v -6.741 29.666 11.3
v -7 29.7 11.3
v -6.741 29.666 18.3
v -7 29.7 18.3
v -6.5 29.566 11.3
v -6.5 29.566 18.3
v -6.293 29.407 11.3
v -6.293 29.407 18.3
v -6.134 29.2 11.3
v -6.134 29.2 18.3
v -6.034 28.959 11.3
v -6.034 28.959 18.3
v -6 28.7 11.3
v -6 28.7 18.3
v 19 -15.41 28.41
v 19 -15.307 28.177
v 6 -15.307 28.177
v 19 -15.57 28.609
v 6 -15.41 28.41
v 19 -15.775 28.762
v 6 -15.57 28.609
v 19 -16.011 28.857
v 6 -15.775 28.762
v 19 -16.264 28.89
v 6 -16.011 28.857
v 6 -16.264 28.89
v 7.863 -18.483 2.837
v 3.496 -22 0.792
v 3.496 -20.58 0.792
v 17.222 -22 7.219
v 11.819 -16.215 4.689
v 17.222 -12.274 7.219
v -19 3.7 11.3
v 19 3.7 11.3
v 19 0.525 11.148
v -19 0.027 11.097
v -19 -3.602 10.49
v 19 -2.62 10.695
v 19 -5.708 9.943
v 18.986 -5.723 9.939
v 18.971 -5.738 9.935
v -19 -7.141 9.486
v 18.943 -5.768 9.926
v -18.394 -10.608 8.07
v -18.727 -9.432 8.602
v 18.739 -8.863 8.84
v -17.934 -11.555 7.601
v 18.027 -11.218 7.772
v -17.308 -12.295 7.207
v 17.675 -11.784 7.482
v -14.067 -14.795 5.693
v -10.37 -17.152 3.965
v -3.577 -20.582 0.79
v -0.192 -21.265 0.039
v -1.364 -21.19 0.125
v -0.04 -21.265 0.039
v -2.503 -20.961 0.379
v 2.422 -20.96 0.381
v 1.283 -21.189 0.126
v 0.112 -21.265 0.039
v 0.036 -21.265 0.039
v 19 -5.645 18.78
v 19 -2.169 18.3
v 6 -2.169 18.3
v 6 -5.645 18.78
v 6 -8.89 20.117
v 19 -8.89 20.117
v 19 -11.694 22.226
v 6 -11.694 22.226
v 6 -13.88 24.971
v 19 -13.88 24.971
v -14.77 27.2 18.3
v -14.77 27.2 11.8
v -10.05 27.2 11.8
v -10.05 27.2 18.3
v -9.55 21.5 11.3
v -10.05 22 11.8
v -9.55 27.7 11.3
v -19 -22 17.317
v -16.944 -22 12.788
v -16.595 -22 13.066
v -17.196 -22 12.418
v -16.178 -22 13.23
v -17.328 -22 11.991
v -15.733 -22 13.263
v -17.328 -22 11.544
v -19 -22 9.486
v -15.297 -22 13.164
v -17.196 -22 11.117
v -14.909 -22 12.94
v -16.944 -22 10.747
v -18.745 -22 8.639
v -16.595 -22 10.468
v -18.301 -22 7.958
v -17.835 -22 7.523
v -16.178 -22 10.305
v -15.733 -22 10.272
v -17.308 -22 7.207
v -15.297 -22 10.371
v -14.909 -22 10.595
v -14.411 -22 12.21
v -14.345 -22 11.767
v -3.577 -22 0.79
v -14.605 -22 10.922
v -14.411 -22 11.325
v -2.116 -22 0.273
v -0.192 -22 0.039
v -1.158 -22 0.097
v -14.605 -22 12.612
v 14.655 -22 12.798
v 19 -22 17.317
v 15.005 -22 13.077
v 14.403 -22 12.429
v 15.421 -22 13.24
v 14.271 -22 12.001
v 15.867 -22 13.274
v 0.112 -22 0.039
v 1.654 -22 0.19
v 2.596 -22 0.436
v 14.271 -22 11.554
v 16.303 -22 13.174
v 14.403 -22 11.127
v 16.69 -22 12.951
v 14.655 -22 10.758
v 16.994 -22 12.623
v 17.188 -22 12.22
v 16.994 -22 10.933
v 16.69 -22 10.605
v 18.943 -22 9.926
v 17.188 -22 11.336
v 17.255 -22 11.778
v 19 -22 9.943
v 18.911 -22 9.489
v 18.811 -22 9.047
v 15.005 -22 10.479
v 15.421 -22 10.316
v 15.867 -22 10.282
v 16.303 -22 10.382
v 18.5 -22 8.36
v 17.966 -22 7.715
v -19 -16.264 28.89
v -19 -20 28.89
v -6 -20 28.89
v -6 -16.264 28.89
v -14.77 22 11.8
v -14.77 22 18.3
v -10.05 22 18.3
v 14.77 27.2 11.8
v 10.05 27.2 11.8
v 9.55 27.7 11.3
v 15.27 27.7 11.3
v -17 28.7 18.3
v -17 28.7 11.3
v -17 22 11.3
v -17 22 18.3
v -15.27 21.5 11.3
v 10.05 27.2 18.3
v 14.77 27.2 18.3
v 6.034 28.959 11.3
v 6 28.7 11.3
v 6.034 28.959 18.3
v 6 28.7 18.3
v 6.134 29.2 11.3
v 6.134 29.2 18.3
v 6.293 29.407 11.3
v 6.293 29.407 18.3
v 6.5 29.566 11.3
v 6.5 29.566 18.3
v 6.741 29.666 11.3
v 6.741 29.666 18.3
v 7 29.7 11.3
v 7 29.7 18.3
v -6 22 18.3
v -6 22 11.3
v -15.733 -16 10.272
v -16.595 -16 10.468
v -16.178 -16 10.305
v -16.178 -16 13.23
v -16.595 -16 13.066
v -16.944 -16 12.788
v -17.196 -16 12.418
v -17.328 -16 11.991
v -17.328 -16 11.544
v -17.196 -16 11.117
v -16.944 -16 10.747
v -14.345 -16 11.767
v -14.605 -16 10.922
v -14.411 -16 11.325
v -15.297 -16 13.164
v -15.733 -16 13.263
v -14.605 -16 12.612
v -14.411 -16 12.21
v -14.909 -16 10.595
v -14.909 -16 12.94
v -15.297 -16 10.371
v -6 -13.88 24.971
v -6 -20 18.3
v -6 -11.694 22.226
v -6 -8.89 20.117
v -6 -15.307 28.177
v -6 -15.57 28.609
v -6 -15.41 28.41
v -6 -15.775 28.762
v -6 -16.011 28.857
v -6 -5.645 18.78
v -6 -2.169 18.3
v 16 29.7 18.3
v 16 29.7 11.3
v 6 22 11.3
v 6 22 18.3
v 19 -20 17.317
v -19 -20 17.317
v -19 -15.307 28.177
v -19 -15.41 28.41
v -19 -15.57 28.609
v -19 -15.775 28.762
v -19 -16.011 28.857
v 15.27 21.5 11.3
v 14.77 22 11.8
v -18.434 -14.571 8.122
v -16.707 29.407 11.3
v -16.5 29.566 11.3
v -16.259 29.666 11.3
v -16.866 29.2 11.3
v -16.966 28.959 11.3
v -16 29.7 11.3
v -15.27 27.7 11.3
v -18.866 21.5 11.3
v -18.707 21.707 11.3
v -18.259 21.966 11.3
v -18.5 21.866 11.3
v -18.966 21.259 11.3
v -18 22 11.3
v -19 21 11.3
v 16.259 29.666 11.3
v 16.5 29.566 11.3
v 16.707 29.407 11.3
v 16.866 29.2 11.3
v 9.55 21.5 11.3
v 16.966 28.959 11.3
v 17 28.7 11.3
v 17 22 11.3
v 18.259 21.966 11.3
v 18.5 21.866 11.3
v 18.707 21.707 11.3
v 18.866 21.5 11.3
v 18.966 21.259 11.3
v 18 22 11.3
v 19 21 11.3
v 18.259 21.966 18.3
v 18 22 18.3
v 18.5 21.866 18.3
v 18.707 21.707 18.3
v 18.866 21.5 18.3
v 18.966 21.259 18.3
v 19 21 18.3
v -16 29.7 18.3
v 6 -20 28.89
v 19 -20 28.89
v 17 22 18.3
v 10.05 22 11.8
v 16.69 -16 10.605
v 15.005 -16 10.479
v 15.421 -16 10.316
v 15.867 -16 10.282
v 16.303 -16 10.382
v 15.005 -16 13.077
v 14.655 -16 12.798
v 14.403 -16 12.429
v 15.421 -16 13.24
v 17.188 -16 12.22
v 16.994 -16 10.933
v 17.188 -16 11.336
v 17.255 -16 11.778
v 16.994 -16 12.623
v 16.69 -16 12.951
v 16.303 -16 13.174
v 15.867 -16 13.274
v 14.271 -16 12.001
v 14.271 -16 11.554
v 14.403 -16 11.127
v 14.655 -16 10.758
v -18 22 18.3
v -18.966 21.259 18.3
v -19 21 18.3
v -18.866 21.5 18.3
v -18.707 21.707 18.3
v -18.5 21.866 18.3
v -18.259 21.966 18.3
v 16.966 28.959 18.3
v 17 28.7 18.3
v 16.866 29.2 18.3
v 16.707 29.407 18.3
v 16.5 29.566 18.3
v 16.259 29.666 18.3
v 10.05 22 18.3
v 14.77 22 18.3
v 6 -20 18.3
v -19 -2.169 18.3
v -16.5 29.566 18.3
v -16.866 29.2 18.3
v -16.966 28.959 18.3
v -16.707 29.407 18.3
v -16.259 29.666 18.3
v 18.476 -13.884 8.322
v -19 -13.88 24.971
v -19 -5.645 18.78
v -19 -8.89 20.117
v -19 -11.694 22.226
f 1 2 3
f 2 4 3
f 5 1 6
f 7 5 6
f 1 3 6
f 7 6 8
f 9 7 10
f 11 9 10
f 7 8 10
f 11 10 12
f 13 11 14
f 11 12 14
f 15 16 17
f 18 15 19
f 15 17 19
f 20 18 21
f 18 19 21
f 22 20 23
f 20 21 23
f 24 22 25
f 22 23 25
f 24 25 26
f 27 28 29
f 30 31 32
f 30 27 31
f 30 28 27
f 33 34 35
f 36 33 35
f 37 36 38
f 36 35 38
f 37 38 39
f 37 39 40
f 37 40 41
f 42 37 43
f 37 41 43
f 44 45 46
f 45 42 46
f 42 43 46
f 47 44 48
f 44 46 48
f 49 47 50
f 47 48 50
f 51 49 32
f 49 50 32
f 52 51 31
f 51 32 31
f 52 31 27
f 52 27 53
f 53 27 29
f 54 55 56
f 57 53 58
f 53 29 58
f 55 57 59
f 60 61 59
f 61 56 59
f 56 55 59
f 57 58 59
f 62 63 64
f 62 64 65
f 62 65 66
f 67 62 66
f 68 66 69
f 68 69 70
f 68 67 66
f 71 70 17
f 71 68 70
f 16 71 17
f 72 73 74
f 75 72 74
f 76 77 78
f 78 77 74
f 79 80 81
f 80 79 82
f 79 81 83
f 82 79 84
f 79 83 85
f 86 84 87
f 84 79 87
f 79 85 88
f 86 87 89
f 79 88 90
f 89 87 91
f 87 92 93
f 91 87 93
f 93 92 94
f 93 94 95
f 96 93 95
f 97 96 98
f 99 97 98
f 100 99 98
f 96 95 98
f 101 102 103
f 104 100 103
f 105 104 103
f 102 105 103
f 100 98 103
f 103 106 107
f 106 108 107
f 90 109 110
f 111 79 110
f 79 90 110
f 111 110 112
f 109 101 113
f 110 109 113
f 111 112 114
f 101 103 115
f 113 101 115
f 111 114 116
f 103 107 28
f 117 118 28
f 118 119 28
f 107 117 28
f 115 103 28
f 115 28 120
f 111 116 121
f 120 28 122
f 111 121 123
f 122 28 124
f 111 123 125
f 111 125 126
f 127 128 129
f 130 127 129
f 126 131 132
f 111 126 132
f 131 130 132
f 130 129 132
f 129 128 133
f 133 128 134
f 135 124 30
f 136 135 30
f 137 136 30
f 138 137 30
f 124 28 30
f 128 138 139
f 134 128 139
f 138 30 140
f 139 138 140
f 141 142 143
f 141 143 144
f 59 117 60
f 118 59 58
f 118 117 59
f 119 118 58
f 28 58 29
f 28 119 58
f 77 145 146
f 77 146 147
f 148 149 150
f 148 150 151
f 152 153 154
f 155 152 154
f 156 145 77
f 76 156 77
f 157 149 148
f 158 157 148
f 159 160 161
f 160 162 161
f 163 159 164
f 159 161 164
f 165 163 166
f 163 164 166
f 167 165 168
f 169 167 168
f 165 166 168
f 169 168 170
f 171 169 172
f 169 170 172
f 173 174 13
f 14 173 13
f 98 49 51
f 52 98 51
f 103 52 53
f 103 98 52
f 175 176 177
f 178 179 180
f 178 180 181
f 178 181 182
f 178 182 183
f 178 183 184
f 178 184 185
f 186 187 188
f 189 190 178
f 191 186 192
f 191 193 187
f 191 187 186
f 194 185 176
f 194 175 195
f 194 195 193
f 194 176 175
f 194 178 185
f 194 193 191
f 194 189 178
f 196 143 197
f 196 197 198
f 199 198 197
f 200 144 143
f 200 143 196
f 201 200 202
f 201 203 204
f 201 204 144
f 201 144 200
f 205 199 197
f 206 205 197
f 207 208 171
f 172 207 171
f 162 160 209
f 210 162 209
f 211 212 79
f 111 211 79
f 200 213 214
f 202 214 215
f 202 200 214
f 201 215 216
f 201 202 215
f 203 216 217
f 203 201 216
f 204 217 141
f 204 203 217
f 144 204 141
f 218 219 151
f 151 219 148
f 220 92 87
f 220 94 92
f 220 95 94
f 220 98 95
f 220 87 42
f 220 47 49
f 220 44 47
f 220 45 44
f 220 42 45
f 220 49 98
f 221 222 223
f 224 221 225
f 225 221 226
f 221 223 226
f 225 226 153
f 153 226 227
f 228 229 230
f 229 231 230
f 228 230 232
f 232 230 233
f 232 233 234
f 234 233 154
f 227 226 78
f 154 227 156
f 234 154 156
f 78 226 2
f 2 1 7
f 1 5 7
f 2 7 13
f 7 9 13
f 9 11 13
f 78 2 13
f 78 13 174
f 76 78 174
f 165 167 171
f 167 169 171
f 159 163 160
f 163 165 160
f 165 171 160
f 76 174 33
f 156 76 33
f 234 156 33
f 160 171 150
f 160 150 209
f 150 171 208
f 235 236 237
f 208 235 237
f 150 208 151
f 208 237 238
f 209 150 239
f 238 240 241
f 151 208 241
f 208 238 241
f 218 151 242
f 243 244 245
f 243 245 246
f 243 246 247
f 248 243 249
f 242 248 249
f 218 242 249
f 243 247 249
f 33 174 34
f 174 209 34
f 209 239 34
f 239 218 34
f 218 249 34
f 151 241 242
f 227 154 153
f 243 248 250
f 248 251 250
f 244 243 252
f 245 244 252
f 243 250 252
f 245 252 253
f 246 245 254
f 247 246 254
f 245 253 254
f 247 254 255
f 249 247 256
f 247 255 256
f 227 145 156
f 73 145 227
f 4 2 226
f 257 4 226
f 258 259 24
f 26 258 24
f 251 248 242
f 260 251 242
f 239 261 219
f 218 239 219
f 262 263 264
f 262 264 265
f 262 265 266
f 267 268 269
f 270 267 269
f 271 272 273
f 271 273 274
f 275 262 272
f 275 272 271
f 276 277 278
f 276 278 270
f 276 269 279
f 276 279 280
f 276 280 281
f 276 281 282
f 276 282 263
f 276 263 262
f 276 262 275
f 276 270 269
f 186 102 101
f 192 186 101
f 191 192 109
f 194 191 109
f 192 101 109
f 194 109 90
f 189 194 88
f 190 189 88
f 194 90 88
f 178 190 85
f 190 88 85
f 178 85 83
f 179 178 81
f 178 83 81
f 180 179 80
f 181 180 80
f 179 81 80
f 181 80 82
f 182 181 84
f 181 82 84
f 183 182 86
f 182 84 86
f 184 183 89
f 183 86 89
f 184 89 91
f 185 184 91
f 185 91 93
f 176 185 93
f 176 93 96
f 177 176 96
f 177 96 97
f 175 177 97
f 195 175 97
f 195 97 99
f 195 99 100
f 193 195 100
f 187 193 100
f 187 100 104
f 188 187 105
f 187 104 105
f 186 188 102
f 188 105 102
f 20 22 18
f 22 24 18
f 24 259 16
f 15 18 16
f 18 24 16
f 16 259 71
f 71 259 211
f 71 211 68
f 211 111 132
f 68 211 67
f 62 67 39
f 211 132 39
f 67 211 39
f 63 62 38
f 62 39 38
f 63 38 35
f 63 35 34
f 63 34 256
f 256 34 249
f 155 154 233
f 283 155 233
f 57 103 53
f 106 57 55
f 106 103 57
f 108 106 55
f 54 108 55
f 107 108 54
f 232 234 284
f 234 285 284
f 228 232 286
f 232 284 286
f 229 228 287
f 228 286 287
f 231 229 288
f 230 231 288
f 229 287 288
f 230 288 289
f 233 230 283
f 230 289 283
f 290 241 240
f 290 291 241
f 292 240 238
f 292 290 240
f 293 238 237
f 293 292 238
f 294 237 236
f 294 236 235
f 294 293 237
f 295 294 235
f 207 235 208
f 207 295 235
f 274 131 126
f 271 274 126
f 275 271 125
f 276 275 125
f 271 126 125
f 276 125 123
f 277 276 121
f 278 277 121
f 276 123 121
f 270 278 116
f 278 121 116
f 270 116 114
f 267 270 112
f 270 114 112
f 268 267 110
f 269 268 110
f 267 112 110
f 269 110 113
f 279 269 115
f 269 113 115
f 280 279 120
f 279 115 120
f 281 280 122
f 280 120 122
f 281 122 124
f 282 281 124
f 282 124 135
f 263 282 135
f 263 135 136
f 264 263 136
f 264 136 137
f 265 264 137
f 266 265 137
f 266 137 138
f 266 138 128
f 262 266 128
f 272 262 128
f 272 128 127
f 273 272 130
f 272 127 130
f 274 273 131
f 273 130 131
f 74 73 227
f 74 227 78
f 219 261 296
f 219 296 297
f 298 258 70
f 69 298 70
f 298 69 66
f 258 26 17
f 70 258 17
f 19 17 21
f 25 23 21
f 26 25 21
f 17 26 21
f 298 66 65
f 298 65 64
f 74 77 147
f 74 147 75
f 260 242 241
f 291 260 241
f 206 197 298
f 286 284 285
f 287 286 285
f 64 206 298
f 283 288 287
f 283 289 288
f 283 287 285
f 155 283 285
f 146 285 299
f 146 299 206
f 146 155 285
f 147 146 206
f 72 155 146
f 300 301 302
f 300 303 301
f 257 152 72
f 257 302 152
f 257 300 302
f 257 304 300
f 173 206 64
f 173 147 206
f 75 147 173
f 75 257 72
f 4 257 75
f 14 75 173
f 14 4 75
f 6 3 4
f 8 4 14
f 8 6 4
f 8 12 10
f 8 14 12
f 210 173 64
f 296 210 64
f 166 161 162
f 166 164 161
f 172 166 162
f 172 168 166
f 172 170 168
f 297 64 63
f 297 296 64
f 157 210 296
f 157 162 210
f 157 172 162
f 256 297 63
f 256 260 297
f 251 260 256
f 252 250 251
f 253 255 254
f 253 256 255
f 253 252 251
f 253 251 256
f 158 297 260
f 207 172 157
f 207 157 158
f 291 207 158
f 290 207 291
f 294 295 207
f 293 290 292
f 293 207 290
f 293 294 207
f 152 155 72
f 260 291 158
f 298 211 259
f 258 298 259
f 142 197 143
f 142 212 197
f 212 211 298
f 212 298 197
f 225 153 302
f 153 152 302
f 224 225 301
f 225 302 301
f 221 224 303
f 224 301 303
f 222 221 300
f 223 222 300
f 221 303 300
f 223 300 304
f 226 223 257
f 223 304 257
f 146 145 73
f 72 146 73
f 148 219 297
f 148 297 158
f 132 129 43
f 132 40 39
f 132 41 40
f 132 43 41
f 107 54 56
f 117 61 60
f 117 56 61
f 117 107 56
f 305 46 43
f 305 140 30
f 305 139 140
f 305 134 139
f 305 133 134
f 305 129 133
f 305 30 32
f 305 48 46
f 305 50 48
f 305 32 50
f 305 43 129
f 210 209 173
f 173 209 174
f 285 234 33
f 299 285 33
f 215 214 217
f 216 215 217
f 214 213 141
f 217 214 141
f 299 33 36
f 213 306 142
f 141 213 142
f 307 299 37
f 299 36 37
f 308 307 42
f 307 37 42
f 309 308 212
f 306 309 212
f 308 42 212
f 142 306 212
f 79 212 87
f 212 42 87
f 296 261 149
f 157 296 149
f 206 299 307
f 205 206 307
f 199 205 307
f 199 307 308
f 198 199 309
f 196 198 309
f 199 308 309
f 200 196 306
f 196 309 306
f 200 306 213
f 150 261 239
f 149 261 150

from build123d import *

# Parameters (mm, degrees)
SKETCH_W        = 4.72
SKETCH_H        = 5.2
PAD_DEPTH       = 18.3
POCKET_DEPTH    = 38.001
SKETCH002_R     = 1.5
POCKET001_DEPTH = 6
PAD001_DEPTH    = 13
SKETCH004_W     = 2
SKETCH004_H     = 0.982872
POCKET002_DEPTH = 38.001
POCKET003_DEPTH = 51.701
FILLET_R        = 1
CHAMFER_SIZE    = 0.5
FILLET001_R     = 1


with BuildPart() as part:
    # Sketch → Pad (new body)
    with BuildSketch(Plane.XY):
        Polygon((-19, 22), (-19, -22), (19, -22), (19, 22), (17, 22), (17, 29.7), (6, 29.7), (6, 22), (-6, 22), (-6, 29.7), (-17, 29.7), (-17, 22), align=None)
        with Locations((-12.41, 24.6)):
            Rectangle(SKETCH_W, SKETCH_H, mode=Mode.SUBTRACT)
        with Locations((12.41, 24.6)):
            Rectangle(SKETCH_W, SKETCH_H, mode=Mode.SUBTRACT)
    extrude(amount=PAD_DEPTH)

    # Sketch001 (on Face3 of Pad) → Pocket (cut, through all)
    with BuildSketch(Plane.YZ.offset(19)):
        with BuildLine():
            Line((29.7, 11.3), (29.7, 0))
            Line((29.7, 0), (-21.3, 0))
            ThreePointArc((3.7, 11.3), (-10.017598, 8.343801), (-21.3, 0))
            Line((29.7, 11.3), (3.7, 11.3))
        make_face()
    extrude(amount=-POCKET_DEPTH, mode=Mode.SUBTRACT)

    # Sketch002 (on Face5 of Pocket) → Pocket001 (cut)
    with BuildSketch(Plane.XZ.offset(22)):
        with Locations((-15.844609, 11.767382)):
            Circle(SKETCH002_R)
        with Locations((15.754541, 11.777902)):
            Circle(SKETCH002_R)
    extrude(amount=-POCKET001_DEPTH, mode=Mode.SUBTRACT)

    # Sketch003 (on Face1 of Pocket001) → Pad001 (join)
    with BuildSketch(Plane(origin=(-19, 0, 0), x_dir=(0, -1, 0), z_dir=(-1, 0, 0))):
        with BuildLine():
            Line((20, 18.3), (1.881002, 18.3))
            ThreePointArc((1.881002, 18.3), (10.537629, 21.219302), (15.5, 28.88966))
            Line((20, 28.88966), (15.5, 28.88966))
            Line((20, 18.3), (20, 28.88966))
        make_face()
    pad001 = extrude(amount=-PAD001_DEPTH)

    # Mirrored: Pad001 across YZ
    add(pad001.mirror(Plane.YZ))

    # Sketch004 (on Face5 of Mirrored) → Pocket002 (cut, through all)
    with BuildSketch(Plane(origin=(-19, 0, 0), x_dir=(0, -1, 0), z_dir=(-1, 0, 0))):
        with Locations((21, 17.808564)):
            Rectangle(SKETCH004_W, SKETCH004_H)
    extrude(amount=-POCKET002_DEPTH, mode=Mode.SUBTRACT)

    # Sketch005 (on Face23 of Pocket002) → Pocket003 (cut, through all)
    with BuildSketch(Plane.XZ.offset(22)):
        with BuildLine():
            add(Edge.make_bspline(
                [(-19.030813, 9.913328), (-19.030294, 8.01238), (-17.308198, 7.207429)],
                knots=[1.082896, 1.082896, 1.082896, 2.216203, 2.216203, 2.216203], degree=2, weights=[1, 0.843702, 1]))
            Line((-17.308198, 7.207429), (-3.577259, 0.790051))
            add(Edge.make_bspline(
                [(-3.577259, 0.790051), (-1.968517, 0.037468), (-0.192474, 0.03938)],
                knots=[2.215888, 2.215888, 2.215888, 2.654527, 2.654527, 2.654527], degree=2, weights=[1, 0.976046, 1]))
            Line((-0.192474, 0.03938), (0.111534, 0.039482))
            add(Edge.make_bspline(
                [(0.111534, 0.039482), (1.887576, 0.038752), (3.495769, 0.792404)],
                knots=[2.653039, 2.653039, 2.653039, 3.091677, 3.091677, 3.091677], degree=2, weights=[1, 0.976046, 1]))
            Line((3.495769, 0.792404), (17.222042, 7.218925))
            add(Edge.make_bspline(
                [(17.222042, 7.218925), (18.943553, 8.025023), (18.94269, 9.92597)],
                knots=[3.091363, 3.091363, 3.091363, 4.22467, 4.22467, 4.22467], degree=2, weights=[1, 0.843702, 1]))
            Line((18.94269, 9.92597), (19.755945, 10.17424))
            Line((19.755945, 10.17424), (19.755945, -1.191288))
            Line((19.755945, -1.191288), (-20.023405, -1.191288))
            Line((-20.023405, -1.191288), (-20.023405, 9.913328))
            Line((-20.023405, 9.913328), (-19.030813, 9.913328))
        make_face()
    extrude(amount=-POCKET003_DEPTH, mode=Mode.SUBTRACT)

    # Fillet
    fillet_edges = [part.edges().sort_by_distance(p)[0] for p in [
        (19, 22, 14.8),
        (17, 29.7, 14.8),
        (6, 29.7, 14.8),
        (-6, 29.7, 14.8),
        (-17, 29.7, 14.8),
        (-19, 22, 14.8),
    ]]
    fillet(fillet_edges, radius=FILLET_R)

    # Chamfer
    chamfer_edges = [part.edges().sort_by_distance(p)[0] for p in [
        (12.41, 22, 11.3),
        (10.05, 24.6, 11.3),
        (12.41, 27.2, 11.3),
        (14.77, 24.6, 11.3),
        (-10.05, 24.6, 11.3),
        (-12.41, 22, 11.3),
        (-14.77, 24.6, 11.3),
        (-12.41, 27.2, 11.3),
    ]]
    chamfer(chamfer_edges, length=CHAMFER_SIZE)

    # Fillet001
    fillet001_edges = [part.edges().sort_by_distance(p)[0] for p in [
        (-12.5, -15.5, 28.88966),
        (12.5, -15.5, 28.88966),
    ]]
    fillet(fillet001_edges, radius=FILLET001_R)


solid = part.part
